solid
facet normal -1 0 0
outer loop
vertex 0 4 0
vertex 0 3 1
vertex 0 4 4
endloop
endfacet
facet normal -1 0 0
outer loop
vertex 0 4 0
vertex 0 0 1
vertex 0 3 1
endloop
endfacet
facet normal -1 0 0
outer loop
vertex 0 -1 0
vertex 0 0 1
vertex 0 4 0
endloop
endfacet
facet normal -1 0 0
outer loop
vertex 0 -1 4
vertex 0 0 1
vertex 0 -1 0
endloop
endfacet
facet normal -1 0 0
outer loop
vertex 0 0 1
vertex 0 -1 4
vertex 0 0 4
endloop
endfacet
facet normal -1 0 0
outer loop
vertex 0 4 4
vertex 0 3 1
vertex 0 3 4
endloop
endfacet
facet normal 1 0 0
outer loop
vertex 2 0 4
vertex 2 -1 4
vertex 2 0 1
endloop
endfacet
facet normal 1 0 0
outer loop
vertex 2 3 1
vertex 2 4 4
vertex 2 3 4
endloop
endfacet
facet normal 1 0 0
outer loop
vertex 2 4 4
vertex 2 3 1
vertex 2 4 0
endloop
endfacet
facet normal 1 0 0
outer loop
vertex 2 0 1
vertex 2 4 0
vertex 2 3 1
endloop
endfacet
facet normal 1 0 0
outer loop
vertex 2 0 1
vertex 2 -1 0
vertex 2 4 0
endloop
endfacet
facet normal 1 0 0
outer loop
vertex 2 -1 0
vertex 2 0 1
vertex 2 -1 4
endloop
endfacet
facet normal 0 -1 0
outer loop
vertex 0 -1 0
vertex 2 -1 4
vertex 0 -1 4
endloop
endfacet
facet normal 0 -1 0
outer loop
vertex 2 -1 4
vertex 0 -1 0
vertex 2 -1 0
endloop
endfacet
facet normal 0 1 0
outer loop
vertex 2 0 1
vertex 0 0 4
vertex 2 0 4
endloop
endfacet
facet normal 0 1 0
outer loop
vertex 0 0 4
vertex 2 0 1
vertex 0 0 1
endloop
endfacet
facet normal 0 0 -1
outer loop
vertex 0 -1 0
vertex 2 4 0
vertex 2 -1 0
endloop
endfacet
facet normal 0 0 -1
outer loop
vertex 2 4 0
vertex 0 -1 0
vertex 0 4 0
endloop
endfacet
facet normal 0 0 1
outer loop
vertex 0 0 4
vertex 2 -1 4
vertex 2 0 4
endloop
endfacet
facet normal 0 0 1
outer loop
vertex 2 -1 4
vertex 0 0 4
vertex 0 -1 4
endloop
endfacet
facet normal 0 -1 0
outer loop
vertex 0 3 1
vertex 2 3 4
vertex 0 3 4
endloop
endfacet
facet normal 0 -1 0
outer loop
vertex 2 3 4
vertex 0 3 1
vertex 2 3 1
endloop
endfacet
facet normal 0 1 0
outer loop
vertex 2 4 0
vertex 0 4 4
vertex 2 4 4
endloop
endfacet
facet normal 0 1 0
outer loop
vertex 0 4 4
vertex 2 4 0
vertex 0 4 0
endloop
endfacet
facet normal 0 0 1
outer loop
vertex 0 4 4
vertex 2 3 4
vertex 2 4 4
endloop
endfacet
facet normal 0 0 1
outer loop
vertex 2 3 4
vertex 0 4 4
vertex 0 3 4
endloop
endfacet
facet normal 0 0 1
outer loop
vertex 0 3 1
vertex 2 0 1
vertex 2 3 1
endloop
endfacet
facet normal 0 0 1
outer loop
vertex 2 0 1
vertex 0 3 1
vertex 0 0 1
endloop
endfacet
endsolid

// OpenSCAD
//This is my first varialbe
myFirstVariable = 2; 
//This is my second, definced as 2 times the first
mySecondVariable = myFirstVariable * 2;

echo(myFirstVariable);

echo(mySecondVariable);


translate([0,0,0]){
	rotate([90,0,0]){
		cube([myFirstVariable,mySecondVariable,1]);
	}
}

translate([0,mySecondVariable,0]){
	rotate([90,0,0]){
		cube([myFirstVariable,mySecondVariable,1]);
	}
}

translate([0,0,0]){
	rotate([0,0,0]){
		cube([myFirstVariable,mySecondVariable,1]);
	}
}
